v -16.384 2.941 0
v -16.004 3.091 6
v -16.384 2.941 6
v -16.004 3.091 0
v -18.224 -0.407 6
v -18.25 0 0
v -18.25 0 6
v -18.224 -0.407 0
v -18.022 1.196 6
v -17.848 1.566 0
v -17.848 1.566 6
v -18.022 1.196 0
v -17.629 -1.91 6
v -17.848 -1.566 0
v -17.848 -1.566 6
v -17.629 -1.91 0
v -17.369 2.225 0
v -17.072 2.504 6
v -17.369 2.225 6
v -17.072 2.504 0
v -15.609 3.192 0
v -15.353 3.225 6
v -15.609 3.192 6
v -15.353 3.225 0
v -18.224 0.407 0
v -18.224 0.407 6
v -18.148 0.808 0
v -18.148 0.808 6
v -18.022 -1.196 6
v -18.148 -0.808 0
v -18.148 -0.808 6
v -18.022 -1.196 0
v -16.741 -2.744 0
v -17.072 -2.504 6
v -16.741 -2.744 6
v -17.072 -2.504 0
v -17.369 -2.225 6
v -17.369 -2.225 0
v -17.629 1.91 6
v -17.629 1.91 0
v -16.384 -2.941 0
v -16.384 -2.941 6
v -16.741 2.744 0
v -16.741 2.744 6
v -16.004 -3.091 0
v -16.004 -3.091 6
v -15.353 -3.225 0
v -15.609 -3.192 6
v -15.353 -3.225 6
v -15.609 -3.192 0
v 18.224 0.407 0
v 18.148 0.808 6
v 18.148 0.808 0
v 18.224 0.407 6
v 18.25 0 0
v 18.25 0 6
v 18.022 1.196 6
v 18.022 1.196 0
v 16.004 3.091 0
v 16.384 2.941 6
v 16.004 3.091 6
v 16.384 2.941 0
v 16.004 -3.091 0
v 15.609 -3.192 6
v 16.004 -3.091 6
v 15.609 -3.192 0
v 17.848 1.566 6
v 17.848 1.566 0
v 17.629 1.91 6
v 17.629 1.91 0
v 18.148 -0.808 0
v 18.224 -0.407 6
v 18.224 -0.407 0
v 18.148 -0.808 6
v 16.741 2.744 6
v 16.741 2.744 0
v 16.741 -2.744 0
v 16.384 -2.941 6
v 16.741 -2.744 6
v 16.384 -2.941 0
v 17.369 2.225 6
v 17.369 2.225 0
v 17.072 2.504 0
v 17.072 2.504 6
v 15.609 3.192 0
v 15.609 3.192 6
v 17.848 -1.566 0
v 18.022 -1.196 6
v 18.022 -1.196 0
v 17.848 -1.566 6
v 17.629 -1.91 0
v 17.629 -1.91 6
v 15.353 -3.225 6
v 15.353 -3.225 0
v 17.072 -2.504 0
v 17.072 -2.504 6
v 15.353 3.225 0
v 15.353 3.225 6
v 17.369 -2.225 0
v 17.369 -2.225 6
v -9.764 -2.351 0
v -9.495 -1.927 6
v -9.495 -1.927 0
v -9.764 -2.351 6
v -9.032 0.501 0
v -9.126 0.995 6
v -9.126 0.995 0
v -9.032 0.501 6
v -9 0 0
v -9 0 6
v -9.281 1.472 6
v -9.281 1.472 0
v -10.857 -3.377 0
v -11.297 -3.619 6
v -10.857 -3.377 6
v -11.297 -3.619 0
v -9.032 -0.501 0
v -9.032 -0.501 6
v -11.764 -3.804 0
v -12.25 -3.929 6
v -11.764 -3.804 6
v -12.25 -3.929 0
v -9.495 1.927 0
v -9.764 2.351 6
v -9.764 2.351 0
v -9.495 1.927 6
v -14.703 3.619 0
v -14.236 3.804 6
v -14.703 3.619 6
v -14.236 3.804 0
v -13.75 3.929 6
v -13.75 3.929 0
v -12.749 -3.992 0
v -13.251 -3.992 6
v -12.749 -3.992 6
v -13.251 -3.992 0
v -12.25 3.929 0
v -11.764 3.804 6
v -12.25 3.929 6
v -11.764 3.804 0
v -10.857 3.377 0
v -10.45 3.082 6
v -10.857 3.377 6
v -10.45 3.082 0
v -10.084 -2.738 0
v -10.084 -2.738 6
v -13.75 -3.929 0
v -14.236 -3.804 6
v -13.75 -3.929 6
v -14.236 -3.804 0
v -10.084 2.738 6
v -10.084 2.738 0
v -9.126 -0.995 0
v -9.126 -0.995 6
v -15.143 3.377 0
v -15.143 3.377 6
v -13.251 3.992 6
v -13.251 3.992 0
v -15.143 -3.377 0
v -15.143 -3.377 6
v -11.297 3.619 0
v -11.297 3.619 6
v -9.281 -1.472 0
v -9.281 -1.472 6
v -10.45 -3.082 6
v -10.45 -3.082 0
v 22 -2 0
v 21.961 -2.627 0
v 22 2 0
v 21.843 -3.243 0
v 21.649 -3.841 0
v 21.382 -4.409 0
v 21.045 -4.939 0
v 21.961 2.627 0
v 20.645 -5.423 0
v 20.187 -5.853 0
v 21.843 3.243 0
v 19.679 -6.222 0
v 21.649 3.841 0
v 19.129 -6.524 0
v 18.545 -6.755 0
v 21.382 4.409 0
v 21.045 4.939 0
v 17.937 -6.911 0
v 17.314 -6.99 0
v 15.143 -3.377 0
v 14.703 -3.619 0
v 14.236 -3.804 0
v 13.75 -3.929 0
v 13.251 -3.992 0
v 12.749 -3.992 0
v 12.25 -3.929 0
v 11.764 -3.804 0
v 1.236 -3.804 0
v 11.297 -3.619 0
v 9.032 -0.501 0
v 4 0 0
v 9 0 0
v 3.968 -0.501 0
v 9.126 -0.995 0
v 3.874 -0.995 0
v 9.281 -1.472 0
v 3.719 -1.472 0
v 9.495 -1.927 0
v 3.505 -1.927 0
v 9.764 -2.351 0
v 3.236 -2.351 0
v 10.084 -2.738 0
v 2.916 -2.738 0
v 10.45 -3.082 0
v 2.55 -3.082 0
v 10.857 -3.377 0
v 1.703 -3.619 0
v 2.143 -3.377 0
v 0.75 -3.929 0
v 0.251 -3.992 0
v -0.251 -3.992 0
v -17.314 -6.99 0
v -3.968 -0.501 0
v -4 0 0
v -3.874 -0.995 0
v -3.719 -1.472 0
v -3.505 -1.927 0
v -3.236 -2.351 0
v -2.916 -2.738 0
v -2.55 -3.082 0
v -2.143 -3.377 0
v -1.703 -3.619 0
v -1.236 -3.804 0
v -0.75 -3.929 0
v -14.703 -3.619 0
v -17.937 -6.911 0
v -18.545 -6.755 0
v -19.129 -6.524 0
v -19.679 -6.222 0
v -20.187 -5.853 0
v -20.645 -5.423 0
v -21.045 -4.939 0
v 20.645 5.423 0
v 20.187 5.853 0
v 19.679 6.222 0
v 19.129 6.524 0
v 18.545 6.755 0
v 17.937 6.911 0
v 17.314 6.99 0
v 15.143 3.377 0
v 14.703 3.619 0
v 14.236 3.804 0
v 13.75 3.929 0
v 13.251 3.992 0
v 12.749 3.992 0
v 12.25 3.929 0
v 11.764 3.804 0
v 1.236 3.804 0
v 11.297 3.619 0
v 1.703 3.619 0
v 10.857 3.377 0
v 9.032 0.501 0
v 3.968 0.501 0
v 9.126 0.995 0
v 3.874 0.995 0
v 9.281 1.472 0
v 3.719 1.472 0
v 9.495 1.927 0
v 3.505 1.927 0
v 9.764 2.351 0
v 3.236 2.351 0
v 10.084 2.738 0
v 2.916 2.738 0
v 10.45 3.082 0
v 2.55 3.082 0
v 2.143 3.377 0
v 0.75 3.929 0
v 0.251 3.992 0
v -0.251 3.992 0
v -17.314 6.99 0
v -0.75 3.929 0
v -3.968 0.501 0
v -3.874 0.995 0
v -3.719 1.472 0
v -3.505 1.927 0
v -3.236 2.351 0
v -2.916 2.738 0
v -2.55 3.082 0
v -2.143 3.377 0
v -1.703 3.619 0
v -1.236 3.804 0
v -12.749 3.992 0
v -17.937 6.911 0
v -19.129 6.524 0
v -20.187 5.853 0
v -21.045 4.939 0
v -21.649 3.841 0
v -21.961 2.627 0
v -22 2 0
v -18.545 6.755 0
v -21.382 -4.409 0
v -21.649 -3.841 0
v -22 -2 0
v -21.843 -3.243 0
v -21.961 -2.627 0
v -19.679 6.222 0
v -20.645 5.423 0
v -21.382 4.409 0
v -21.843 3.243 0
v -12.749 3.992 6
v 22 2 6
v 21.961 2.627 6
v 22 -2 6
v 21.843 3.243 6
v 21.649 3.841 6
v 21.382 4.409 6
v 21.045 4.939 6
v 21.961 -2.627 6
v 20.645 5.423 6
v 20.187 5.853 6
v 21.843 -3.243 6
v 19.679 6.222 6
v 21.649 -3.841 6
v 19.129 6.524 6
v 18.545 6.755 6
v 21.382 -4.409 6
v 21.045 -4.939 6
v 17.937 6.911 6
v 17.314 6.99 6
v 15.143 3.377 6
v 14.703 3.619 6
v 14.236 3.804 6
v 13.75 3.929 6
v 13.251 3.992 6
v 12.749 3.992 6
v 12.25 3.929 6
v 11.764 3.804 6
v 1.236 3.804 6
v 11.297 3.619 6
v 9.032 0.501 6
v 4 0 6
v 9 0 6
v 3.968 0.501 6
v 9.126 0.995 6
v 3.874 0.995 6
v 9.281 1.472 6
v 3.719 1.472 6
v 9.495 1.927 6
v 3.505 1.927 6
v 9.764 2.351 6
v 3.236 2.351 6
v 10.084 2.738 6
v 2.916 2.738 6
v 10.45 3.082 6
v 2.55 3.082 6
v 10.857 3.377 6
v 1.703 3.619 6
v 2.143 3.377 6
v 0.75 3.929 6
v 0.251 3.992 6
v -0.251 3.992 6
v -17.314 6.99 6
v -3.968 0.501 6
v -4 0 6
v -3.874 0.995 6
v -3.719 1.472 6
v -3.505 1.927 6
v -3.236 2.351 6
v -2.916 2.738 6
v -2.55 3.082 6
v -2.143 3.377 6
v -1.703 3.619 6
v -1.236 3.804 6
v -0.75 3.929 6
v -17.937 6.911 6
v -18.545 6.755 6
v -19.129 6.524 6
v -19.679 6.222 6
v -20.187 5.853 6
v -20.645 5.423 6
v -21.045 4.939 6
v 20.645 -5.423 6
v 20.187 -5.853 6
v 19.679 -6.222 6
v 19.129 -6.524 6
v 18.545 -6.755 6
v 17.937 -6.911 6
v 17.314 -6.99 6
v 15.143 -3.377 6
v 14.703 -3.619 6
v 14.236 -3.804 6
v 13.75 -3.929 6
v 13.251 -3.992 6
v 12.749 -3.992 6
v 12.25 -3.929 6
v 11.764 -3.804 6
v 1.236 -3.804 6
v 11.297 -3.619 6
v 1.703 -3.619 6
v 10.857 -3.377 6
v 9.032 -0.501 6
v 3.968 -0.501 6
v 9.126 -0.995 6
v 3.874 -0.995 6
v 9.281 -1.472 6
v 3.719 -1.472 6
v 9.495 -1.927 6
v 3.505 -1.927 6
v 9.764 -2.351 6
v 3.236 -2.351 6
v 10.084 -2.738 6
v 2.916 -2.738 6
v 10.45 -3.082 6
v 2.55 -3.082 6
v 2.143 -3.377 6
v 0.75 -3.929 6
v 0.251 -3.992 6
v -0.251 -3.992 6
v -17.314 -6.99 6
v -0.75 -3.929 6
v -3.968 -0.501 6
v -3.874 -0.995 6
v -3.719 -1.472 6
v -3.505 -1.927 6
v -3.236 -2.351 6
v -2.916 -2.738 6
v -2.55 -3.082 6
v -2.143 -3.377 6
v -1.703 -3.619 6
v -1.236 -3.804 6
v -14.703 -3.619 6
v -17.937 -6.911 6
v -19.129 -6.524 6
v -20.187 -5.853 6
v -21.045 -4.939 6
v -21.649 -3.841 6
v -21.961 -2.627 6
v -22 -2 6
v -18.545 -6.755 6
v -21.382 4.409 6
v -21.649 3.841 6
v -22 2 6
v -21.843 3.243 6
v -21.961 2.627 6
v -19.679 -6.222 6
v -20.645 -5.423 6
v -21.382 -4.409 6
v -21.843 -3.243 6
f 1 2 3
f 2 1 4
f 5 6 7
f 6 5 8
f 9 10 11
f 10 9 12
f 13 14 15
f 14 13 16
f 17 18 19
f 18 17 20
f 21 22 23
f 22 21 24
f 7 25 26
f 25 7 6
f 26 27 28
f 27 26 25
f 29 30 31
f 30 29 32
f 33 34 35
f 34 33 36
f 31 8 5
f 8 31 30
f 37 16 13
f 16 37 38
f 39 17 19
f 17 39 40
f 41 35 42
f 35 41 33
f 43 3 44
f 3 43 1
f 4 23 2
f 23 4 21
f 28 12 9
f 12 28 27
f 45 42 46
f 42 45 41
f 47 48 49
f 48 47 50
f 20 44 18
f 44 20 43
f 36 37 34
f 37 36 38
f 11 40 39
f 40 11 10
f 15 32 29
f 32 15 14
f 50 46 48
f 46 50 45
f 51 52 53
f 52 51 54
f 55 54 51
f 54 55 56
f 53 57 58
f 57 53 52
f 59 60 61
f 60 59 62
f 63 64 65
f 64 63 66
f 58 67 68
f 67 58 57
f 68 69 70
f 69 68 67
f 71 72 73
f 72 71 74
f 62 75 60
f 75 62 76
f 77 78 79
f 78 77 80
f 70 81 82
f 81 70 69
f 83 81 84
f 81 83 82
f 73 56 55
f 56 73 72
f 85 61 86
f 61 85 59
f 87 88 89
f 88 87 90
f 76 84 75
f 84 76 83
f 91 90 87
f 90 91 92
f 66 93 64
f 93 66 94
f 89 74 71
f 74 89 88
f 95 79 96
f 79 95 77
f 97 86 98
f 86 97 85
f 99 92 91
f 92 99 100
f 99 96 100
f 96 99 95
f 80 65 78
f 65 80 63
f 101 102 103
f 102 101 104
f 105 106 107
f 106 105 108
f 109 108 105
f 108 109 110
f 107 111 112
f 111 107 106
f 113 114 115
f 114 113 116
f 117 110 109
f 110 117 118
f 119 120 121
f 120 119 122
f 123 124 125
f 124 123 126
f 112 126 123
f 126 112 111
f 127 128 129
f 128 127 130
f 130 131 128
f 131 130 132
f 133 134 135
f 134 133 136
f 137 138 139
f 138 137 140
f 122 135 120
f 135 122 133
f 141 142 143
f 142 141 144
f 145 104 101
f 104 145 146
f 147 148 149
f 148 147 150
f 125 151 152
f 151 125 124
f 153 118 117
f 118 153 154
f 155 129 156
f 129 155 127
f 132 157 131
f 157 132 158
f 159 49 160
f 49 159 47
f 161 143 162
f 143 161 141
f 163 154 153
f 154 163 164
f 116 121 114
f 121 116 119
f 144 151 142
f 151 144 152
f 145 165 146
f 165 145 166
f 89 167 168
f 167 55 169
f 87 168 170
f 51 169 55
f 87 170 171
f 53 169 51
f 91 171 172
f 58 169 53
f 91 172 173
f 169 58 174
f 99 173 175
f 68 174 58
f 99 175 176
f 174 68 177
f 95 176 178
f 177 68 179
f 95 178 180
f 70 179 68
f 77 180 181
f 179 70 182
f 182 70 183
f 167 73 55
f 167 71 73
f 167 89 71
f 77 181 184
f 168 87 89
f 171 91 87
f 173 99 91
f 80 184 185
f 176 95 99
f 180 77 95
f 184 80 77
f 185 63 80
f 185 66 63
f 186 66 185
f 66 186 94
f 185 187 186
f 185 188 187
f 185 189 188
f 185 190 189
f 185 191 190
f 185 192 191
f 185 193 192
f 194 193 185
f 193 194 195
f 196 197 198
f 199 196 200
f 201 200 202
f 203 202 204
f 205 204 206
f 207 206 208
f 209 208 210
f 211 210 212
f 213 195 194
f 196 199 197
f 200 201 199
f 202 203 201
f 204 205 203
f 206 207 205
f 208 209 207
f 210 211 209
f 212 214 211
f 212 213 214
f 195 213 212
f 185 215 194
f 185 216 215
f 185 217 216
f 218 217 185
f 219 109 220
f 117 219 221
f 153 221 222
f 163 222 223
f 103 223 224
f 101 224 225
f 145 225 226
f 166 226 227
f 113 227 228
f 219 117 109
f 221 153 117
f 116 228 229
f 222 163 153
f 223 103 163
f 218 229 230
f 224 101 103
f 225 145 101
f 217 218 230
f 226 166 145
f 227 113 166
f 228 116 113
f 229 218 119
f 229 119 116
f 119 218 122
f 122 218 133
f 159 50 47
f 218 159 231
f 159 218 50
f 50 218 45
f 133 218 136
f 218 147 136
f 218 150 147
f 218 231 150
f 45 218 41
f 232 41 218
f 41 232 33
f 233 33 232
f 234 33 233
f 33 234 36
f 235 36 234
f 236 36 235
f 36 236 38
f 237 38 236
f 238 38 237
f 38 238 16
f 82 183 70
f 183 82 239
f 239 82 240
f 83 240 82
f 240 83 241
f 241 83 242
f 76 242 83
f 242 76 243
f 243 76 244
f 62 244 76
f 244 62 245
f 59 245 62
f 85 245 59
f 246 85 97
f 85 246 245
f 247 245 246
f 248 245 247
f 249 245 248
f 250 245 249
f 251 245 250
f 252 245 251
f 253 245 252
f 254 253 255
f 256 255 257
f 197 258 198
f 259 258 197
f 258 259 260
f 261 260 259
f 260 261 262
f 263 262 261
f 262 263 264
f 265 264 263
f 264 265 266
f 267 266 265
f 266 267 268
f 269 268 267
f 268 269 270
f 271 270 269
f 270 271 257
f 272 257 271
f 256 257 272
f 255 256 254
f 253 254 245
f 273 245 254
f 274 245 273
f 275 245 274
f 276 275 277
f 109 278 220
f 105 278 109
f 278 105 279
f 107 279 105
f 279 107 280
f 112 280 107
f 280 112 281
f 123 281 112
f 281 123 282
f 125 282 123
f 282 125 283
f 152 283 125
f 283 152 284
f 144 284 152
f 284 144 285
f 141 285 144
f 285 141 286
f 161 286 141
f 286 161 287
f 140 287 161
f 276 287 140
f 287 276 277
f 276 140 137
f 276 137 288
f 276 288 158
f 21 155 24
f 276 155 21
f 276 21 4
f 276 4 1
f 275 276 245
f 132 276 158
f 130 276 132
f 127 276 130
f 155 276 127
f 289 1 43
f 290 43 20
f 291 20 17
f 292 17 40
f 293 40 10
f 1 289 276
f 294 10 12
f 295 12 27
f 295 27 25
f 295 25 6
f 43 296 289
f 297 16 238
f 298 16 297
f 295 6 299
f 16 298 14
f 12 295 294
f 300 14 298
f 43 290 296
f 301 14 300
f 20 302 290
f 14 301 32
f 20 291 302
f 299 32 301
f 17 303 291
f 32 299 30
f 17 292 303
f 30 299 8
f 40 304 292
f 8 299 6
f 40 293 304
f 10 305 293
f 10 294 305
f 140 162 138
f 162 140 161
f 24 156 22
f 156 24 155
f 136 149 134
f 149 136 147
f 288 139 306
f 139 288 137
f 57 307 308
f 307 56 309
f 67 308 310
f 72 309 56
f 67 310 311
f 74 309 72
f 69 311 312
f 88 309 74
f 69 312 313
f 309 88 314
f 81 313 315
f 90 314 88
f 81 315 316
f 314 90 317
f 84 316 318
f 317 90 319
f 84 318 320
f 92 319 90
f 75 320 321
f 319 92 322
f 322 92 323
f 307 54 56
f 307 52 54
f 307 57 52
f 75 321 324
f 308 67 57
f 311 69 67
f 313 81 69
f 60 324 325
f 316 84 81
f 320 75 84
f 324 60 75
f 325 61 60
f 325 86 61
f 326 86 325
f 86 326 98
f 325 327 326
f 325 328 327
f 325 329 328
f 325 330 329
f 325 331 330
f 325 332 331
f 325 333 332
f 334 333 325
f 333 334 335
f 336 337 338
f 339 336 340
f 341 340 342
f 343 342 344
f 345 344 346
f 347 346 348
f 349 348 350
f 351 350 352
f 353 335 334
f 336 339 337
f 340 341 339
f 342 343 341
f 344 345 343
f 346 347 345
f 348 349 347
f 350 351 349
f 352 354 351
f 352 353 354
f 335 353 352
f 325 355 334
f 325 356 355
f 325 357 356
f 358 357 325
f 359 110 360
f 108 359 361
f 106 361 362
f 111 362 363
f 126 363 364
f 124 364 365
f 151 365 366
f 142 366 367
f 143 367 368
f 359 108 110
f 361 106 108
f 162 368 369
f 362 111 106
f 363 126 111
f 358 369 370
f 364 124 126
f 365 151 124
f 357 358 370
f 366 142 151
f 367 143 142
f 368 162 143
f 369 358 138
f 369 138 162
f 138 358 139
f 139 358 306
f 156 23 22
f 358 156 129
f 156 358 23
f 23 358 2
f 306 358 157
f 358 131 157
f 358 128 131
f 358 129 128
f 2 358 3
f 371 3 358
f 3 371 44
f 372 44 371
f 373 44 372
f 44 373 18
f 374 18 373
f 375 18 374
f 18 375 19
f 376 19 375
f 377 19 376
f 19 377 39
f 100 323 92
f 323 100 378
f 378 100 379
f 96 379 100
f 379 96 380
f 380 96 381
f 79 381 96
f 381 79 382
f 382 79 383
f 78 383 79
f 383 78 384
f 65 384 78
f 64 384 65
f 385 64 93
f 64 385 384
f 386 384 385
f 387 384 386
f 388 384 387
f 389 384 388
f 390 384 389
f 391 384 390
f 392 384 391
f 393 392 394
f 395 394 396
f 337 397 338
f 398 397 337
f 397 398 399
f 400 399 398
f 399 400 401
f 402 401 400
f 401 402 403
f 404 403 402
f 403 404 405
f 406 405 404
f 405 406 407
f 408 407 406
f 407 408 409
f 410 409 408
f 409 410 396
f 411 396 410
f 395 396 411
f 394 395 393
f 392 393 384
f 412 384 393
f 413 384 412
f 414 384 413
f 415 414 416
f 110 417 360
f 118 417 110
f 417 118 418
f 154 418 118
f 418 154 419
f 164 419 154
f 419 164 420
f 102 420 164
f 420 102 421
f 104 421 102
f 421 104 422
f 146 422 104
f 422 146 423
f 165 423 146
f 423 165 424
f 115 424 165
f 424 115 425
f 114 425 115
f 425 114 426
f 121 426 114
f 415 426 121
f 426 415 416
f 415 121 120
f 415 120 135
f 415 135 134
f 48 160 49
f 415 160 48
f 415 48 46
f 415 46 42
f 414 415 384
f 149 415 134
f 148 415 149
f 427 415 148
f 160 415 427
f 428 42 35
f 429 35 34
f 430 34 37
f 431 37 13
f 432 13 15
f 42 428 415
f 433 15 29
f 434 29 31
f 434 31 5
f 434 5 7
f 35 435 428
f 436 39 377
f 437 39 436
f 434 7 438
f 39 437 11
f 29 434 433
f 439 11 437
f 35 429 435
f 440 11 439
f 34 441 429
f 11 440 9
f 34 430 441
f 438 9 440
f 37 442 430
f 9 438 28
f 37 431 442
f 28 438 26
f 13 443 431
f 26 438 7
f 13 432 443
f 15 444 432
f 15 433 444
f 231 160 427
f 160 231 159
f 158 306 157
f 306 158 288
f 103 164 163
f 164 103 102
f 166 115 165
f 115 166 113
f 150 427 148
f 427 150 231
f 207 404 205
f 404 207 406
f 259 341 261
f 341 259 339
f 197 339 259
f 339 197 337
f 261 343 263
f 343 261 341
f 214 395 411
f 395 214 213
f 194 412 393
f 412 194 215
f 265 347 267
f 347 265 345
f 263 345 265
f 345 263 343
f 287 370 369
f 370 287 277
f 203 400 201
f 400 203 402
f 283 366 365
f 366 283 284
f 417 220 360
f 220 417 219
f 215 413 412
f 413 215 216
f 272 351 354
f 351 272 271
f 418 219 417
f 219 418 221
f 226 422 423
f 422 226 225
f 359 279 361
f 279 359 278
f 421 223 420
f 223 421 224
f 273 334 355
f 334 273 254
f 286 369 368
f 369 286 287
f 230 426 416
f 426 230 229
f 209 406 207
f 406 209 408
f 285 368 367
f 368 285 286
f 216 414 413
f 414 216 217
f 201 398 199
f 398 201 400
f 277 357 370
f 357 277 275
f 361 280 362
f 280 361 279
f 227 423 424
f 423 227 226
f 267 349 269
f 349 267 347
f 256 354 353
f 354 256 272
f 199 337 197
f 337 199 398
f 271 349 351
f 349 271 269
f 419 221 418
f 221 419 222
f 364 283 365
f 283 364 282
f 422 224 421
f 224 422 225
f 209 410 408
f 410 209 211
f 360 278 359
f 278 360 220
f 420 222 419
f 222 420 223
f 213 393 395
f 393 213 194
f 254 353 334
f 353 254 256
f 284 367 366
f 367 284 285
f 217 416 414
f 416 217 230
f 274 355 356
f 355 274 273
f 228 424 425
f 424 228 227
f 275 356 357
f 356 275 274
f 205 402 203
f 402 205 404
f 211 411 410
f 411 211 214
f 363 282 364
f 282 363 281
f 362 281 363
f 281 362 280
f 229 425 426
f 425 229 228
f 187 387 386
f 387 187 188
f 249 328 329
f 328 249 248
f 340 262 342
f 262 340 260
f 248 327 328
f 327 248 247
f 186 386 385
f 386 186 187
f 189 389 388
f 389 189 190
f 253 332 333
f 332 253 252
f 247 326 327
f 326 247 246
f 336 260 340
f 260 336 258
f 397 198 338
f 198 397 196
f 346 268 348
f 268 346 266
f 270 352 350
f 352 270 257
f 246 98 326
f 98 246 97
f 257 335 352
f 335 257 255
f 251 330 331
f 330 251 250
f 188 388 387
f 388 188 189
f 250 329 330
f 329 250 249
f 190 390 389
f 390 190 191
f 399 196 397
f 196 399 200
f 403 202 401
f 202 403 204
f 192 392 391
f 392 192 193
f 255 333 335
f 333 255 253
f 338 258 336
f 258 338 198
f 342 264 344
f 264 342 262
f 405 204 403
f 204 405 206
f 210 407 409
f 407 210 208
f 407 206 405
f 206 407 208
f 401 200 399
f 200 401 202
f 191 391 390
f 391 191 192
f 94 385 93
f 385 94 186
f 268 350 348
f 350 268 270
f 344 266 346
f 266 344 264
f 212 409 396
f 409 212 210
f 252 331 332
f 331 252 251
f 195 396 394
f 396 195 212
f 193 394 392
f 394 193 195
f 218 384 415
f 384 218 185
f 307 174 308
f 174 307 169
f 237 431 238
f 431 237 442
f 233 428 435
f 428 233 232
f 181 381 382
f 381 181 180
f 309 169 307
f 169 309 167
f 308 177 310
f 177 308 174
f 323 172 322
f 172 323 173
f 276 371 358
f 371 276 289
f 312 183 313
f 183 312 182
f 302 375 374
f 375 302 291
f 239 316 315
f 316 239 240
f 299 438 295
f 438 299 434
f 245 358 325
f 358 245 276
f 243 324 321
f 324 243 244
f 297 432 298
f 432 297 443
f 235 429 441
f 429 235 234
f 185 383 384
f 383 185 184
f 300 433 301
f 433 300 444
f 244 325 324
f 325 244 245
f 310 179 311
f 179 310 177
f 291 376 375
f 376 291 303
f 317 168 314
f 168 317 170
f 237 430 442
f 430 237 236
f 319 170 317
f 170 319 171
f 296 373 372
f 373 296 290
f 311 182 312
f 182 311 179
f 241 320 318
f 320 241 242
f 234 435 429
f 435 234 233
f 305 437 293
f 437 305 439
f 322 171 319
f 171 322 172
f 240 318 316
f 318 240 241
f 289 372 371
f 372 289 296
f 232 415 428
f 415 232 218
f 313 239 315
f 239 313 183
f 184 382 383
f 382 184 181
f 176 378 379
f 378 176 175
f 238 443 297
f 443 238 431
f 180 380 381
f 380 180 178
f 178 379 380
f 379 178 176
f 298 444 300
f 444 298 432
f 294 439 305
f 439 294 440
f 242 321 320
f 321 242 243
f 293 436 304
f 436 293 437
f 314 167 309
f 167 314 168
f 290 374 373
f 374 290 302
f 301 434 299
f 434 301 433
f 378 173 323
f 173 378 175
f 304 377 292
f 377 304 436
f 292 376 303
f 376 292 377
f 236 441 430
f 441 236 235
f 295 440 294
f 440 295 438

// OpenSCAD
$fn = 50;

difference() {
	union() {
		hull() {
			translate(v = [-17.0, 2.0, 0]) {
				cylinder(h = 6, r = 5);
			}
			translate(v = [17.0, 2.0, 0]) {
				cylinder(h = 6, r = 5);
			}
			translate(v = [-17.0, -2.0, 0]) {
				cylinder(h = 6, r = 5);
			}
			translate(v = [17.0, -2.0, 0]) {
				cylinder(h = 6, r = 5);
			}
		}
	}
	union() {
		translate(v = [-15.0, 0.0, -100.0]) {
			cylinder(h = 200, r = 3.25);
		}
		translate(v = [15.0, 0.0, -100.0]) {
			cylinder(h = 200, r = 3.25);
		}
		translate(v = [-15.0, 0.0, -100.0]) {
			cylinder(h = 200, r = 1.8);
		}
		translate(v = [15.0, 0.0, -100.0]) {
			cylinder(h = 200, r = 1.8);
		}
		translate(v = [-13.0, 0, 0.0]) {
			cylinder(h = 6, r = 4.0);
		}
		cylinder(h = 6, r = 4.0);
		translate(v = [13.0, 0, 0.0]) {
			cylinder(h = 6, r = 4.0);
		}
	}
}
